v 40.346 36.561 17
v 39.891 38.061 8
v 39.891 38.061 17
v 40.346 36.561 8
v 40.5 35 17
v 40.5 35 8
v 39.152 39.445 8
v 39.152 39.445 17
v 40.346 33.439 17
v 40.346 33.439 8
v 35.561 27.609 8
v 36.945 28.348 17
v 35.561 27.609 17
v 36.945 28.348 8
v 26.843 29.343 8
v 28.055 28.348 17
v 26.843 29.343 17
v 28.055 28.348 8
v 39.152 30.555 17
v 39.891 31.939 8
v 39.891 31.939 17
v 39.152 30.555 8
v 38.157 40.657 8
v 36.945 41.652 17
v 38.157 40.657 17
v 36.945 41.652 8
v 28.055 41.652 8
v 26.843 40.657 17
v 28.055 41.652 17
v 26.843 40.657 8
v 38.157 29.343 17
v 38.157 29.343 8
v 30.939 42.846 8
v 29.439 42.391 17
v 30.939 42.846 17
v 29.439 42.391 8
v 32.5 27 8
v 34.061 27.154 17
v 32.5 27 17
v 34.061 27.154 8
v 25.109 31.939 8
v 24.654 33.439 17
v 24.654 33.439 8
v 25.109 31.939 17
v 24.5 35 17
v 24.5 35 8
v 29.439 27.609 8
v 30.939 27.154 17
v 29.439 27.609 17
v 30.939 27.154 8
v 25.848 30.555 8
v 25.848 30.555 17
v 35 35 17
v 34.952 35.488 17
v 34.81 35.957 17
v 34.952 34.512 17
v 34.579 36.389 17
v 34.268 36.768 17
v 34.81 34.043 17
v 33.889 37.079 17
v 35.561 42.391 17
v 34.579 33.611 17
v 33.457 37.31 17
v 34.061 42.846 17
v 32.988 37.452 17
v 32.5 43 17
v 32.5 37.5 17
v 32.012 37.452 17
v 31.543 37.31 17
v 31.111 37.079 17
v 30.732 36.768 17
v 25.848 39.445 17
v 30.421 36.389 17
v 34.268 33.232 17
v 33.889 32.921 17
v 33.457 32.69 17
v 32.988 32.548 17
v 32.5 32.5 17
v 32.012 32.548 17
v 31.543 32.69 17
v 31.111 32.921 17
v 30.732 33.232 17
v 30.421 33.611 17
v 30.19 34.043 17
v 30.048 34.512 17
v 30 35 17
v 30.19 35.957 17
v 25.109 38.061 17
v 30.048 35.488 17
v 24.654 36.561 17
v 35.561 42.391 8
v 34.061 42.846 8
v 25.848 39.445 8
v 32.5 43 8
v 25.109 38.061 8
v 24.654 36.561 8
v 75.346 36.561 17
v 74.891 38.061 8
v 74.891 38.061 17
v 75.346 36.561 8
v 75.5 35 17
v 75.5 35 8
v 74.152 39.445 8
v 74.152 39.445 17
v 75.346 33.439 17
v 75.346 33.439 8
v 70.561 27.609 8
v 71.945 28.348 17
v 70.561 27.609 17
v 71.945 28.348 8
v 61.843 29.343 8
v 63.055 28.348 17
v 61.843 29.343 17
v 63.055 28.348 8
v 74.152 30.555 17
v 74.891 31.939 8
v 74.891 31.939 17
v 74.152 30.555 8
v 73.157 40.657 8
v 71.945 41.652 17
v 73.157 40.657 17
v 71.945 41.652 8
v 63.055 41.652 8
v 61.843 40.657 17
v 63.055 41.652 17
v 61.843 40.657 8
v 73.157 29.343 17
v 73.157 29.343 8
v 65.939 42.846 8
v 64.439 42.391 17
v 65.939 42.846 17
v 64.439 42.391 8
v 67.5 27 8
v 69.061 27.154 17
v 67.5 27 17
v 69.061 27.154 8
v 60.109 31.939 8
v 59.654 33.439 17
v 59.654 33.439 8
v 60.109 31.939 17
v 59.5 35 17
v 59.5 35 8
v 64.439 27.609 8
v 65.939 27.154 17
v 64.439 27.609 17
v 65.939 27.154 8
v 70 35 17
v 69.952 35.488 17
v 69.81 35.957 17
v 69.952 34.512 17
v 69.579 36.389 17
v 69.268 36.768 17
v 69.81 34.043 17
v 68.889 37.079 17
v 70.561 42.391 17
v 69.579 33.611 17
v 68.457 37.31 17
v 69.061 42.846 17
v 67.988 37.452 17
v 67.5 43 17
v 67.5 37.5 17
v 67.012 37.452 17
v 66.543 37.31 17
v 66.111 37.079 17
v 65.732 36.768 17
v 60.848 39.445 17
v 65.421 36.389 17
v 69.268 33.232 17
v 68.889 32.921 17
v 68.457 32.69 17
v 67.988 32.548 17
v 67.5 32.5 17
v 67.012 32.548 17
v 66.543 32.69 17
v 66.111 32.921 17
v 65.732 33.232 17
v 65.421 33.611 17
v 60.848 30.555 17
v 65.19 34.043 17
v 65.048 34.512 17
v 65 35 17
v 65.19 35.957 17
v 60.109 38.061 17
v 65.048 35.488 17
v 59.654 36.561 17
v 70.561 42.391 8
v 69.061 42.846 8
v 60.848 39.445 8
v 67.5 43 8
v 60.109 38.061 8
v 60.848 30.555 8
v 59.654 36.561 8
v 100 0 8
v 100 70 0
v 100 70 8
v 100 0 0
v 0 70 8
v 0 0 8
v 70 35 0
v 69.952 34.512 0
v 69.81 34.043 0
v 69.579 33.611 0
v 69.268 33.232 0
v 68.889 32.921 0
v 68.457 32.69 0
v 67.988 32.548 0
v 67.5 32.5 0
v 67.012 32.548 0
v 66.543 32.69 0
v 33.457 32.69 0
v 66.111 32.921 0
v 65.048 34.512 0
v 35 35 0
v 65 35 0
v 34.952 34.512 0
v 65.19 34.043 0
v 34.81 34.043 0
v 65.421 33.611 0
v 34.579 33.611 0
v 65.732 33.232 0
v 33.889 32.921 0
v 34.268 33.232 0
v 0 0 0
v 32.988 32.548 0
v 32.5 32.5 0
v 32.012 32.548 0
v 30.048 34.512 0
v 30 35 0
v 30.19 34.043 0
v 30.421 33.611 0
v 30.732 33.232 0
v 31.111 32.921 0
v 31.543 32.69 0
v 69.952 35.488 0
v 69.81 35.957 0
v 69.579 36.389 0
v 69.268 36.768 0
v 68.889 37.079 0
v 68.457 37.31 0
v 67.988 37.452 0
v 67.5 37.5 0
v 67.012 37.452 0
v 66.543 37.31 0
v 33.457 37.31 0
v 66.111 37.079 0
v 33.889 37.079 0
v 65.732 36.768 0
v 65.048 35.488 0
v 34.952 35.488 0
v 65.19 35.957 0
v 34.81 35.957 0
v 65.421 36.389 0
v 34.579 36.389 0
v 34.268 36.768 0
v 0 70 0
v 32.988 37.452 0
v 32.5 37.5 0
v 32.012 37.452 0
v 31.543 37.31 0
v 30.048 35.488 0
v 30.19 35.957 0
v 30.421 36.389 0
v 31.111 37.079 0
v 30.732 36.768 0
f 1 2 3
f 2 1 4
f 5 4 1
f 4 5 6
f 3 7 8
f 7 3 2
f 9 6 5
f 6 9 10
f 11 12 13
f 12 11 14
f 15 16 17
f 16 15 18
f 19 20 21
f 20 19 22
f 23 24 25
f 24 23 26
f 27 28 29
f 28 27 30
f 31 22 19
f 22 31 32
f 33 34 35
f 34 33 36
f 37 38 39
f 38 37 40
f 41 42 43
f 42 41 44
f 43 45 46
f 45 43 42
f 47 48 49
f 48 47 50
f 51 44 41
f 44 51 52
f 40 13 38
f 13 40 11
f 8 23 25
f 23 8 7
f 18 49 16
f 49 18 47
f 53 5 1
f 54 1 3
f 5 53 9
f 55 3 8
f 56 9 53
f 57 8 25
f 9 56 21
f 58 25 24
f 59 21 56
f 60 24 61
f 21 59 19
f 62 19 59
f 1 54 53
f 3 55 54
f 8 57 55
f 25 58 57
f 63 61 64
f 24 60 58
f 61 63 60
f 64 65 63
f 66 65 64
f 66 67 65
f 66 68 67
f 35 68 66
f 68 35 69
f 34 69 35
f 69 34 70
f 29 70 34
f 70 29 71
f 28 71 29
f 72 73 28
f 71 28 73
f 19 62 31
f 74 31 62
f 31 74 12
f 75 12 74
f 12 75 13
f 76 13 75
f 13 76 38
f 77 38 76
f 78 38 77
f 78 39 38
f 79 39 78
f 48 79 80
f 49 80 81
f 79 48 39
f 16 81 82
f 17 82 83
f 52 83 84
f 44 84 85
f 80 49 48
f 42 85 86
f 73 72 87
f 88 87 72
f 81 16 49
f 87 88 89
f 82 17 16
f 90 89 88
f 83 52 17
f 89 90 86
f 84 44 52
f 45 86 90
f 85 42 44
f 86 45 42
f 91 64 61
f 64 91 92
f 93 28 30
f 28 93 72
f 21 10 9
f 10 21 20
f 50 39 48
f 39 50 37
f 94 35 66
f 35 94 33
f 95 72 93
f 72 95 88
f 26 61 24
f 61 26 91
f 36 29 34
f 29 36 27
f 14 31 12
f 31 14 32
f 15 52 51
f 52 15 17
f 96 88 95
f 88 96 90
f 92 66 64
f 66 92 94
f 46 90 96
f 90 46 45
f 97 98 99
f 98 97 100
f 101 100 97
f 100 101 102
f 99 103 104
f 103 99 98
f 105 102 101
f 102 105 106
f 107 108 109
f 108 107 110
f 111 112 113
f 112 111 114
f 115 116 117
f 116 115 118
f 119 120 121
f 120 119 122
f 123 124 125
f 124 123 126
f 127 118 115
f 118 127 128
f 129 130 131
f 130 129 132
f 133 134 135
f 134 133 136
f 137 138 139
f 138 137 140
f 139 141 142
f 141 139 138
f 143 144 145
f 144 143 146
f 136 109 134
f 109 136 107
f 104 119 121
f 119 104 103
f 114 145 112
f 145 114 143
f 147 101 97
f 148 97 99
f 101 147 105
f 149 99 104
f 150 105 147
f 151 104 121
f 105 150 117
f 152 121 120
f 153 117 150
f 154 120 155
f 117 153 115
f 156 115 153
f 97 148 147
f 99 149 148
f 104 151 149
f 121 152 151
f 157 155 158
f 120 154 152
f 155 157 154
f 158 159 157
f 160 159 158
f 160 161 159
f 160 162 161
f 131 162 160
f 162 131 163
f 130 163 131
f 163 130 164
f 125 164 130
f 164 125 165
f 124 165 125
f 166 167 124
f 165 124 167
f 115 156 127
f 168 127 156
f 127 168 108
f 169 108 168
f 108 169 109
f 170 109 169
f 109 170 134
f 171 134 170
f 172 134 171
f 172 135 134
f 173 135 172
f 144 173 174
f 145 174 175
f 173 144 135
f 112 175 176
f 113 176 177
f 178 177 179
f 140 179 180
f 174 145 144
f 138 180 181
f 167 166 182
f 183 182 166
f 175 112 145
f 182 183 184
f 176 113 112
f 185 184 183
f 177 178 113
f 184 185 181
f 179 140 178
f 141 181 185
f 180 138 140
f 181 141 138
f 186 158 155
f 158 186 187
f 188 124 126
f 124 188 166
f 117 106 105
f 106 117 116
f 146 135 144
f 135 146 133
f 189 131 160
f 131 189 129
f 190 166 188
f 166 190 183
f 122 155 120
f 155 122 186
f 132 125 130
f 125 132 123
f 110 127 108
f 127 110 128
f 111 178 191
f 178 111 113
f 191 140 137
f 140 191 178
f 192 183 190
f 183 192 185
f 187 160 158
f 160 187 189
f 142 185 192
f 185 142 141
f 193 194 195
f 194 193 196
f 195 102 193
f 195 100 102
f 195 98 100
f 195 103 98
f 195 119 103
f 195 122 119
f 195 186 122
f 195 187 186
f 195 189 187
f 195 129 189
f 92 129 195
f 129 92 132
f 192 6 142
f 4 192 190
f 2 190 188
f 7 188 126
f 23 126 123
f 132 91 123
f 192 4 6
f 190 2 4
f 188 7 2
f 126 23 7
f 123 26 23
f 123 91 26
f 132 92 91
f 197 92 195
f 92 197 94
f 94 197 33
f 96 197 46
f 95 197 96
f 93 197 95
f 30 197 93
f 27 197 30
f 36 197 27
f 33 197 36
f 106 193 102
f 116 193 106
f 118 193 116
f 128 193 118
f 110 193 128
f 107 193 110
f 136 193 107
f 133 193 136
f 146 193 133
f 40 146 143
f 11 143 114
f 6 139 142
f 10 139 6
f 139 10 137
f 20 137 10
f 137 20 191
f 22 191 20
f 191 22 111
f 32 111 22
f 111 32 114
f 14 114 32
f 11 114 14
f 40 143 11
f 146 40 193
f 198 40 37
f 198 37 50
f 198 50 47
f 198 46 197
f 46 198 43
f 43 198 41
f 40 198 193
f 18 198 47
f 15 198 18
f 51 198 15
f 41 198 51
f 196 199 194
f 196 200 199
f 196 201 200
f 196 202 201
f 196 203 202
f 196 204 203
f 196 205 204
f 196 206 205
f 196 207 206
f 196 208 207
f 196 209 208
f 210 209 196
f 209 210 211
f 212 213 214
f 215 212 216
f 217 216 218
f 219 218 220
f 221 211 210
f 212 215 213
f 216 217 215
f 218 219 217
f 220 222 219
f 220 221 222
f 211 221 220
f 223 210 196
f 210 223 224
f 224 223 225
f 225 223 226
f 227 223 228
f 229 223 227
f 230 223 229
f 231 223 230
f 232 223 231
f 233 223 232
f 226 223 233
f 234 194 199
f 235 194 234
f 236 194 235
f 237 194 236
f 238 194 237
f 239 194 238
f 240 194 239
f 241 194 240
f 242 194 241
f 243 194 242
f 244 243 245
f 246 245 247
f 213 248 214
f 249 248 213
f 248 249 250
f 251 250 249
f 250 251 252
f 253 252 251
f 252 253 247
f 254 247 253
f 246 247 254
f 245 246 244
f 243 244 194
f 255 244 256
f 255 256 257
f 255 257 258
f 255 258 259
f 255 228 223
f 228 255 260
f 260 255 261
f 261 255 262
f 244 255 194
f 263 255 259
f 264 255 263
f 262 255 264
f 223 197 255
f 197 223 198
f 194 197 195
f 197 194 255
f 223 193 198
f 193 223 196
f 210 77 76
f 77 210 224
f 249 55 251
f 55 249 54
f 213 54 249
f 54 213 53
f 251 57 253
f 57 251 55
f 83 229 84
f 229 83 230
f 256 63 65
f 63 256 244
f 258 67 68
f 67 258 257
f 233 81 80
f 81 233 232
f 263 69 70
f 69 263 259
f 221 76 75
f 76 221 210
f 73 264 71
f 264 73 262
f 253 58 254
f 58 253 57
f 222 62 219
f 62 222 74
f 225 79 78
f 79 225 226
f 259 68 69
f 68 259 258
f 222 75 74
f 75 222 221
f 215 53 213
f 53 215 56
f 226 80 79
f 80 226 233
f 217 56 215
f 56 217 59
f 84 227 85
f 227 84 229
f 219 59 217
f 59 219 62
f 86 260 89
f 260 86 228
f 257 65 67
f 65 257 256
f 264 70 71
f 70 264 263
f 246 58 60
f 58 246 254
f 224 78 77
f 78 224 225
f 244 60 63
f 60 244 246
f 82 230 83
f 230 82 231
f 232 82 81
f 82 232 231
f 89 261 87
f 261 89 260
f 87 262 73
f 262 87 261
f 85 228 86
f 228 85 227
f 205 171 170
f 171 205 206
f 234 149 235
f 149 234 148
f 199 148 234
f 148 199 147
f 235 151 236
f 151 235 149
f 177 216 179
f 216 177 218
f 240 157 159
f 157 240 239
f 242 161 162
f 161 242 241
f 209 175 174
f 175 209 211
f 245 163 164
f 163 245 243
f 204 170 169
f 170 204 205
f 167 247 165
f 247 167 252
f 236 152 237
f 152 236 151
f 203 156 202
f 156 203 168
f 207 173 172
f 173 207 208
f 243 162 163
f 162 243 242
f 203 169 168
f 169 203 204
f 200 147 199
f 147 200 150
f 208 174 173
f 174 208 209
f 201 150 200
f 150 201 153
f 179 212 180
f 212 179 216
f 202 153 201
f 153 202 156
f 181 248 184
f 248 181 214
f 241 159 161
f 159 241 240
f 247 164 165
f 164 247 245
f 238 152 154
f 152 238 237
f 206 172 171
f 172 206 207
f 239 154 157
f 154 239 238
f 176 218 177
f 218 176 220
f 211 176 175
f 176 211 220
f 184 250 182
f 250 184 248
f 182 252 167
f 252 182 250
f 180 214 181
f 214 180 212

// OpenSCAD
$fn = 32;

// ----------------------------------------------------------------------
// Drill jig: two_boss jig
// ----------------------------------------------------------------------

// --- parameters (mm) ---
plate_l = 100;            // plate length, X
plate_w = 70;             // plate width, Y
plate_t = 8;              // plate thickness
boss_d = 16;              // guide boss diameter
boss_h = 10;              // boss height above the plate
guide_d = 5;              // guide hole diameter
boss_pitch = 35;          // boss pitch
fit_tol = 0.1;            // tolerance for press fits, mm
free_tol = 0.3;           // tolerance for clearance fits, mm

n_boss = 2;  // guide bosses
boss_x0 = (plate_l - (n_boss - 1) * boss_pitch) / 2;  // first boss X
boss_top = plate_t - 1 + boss_h;  // boss crown height
total_h = boss_top;  // overall height

difference() {
  union() {
  cube([plate_l, plate_w, plate_t]);
  for (i = [0 : n_boss - 1])
    translate([boss_x0 + i * boss_pitch, plate_w / 2, plate_t - 1])
      cylinder(h = boss_h, d = boss_d);
  }
  for (i = [0 : n_boss - 1])
    translate([boss_x0 + i * boss_pitch, plate_w / 2, -1])
      cylinder(h = plate_t + boss_h, d = guide_d);
}
